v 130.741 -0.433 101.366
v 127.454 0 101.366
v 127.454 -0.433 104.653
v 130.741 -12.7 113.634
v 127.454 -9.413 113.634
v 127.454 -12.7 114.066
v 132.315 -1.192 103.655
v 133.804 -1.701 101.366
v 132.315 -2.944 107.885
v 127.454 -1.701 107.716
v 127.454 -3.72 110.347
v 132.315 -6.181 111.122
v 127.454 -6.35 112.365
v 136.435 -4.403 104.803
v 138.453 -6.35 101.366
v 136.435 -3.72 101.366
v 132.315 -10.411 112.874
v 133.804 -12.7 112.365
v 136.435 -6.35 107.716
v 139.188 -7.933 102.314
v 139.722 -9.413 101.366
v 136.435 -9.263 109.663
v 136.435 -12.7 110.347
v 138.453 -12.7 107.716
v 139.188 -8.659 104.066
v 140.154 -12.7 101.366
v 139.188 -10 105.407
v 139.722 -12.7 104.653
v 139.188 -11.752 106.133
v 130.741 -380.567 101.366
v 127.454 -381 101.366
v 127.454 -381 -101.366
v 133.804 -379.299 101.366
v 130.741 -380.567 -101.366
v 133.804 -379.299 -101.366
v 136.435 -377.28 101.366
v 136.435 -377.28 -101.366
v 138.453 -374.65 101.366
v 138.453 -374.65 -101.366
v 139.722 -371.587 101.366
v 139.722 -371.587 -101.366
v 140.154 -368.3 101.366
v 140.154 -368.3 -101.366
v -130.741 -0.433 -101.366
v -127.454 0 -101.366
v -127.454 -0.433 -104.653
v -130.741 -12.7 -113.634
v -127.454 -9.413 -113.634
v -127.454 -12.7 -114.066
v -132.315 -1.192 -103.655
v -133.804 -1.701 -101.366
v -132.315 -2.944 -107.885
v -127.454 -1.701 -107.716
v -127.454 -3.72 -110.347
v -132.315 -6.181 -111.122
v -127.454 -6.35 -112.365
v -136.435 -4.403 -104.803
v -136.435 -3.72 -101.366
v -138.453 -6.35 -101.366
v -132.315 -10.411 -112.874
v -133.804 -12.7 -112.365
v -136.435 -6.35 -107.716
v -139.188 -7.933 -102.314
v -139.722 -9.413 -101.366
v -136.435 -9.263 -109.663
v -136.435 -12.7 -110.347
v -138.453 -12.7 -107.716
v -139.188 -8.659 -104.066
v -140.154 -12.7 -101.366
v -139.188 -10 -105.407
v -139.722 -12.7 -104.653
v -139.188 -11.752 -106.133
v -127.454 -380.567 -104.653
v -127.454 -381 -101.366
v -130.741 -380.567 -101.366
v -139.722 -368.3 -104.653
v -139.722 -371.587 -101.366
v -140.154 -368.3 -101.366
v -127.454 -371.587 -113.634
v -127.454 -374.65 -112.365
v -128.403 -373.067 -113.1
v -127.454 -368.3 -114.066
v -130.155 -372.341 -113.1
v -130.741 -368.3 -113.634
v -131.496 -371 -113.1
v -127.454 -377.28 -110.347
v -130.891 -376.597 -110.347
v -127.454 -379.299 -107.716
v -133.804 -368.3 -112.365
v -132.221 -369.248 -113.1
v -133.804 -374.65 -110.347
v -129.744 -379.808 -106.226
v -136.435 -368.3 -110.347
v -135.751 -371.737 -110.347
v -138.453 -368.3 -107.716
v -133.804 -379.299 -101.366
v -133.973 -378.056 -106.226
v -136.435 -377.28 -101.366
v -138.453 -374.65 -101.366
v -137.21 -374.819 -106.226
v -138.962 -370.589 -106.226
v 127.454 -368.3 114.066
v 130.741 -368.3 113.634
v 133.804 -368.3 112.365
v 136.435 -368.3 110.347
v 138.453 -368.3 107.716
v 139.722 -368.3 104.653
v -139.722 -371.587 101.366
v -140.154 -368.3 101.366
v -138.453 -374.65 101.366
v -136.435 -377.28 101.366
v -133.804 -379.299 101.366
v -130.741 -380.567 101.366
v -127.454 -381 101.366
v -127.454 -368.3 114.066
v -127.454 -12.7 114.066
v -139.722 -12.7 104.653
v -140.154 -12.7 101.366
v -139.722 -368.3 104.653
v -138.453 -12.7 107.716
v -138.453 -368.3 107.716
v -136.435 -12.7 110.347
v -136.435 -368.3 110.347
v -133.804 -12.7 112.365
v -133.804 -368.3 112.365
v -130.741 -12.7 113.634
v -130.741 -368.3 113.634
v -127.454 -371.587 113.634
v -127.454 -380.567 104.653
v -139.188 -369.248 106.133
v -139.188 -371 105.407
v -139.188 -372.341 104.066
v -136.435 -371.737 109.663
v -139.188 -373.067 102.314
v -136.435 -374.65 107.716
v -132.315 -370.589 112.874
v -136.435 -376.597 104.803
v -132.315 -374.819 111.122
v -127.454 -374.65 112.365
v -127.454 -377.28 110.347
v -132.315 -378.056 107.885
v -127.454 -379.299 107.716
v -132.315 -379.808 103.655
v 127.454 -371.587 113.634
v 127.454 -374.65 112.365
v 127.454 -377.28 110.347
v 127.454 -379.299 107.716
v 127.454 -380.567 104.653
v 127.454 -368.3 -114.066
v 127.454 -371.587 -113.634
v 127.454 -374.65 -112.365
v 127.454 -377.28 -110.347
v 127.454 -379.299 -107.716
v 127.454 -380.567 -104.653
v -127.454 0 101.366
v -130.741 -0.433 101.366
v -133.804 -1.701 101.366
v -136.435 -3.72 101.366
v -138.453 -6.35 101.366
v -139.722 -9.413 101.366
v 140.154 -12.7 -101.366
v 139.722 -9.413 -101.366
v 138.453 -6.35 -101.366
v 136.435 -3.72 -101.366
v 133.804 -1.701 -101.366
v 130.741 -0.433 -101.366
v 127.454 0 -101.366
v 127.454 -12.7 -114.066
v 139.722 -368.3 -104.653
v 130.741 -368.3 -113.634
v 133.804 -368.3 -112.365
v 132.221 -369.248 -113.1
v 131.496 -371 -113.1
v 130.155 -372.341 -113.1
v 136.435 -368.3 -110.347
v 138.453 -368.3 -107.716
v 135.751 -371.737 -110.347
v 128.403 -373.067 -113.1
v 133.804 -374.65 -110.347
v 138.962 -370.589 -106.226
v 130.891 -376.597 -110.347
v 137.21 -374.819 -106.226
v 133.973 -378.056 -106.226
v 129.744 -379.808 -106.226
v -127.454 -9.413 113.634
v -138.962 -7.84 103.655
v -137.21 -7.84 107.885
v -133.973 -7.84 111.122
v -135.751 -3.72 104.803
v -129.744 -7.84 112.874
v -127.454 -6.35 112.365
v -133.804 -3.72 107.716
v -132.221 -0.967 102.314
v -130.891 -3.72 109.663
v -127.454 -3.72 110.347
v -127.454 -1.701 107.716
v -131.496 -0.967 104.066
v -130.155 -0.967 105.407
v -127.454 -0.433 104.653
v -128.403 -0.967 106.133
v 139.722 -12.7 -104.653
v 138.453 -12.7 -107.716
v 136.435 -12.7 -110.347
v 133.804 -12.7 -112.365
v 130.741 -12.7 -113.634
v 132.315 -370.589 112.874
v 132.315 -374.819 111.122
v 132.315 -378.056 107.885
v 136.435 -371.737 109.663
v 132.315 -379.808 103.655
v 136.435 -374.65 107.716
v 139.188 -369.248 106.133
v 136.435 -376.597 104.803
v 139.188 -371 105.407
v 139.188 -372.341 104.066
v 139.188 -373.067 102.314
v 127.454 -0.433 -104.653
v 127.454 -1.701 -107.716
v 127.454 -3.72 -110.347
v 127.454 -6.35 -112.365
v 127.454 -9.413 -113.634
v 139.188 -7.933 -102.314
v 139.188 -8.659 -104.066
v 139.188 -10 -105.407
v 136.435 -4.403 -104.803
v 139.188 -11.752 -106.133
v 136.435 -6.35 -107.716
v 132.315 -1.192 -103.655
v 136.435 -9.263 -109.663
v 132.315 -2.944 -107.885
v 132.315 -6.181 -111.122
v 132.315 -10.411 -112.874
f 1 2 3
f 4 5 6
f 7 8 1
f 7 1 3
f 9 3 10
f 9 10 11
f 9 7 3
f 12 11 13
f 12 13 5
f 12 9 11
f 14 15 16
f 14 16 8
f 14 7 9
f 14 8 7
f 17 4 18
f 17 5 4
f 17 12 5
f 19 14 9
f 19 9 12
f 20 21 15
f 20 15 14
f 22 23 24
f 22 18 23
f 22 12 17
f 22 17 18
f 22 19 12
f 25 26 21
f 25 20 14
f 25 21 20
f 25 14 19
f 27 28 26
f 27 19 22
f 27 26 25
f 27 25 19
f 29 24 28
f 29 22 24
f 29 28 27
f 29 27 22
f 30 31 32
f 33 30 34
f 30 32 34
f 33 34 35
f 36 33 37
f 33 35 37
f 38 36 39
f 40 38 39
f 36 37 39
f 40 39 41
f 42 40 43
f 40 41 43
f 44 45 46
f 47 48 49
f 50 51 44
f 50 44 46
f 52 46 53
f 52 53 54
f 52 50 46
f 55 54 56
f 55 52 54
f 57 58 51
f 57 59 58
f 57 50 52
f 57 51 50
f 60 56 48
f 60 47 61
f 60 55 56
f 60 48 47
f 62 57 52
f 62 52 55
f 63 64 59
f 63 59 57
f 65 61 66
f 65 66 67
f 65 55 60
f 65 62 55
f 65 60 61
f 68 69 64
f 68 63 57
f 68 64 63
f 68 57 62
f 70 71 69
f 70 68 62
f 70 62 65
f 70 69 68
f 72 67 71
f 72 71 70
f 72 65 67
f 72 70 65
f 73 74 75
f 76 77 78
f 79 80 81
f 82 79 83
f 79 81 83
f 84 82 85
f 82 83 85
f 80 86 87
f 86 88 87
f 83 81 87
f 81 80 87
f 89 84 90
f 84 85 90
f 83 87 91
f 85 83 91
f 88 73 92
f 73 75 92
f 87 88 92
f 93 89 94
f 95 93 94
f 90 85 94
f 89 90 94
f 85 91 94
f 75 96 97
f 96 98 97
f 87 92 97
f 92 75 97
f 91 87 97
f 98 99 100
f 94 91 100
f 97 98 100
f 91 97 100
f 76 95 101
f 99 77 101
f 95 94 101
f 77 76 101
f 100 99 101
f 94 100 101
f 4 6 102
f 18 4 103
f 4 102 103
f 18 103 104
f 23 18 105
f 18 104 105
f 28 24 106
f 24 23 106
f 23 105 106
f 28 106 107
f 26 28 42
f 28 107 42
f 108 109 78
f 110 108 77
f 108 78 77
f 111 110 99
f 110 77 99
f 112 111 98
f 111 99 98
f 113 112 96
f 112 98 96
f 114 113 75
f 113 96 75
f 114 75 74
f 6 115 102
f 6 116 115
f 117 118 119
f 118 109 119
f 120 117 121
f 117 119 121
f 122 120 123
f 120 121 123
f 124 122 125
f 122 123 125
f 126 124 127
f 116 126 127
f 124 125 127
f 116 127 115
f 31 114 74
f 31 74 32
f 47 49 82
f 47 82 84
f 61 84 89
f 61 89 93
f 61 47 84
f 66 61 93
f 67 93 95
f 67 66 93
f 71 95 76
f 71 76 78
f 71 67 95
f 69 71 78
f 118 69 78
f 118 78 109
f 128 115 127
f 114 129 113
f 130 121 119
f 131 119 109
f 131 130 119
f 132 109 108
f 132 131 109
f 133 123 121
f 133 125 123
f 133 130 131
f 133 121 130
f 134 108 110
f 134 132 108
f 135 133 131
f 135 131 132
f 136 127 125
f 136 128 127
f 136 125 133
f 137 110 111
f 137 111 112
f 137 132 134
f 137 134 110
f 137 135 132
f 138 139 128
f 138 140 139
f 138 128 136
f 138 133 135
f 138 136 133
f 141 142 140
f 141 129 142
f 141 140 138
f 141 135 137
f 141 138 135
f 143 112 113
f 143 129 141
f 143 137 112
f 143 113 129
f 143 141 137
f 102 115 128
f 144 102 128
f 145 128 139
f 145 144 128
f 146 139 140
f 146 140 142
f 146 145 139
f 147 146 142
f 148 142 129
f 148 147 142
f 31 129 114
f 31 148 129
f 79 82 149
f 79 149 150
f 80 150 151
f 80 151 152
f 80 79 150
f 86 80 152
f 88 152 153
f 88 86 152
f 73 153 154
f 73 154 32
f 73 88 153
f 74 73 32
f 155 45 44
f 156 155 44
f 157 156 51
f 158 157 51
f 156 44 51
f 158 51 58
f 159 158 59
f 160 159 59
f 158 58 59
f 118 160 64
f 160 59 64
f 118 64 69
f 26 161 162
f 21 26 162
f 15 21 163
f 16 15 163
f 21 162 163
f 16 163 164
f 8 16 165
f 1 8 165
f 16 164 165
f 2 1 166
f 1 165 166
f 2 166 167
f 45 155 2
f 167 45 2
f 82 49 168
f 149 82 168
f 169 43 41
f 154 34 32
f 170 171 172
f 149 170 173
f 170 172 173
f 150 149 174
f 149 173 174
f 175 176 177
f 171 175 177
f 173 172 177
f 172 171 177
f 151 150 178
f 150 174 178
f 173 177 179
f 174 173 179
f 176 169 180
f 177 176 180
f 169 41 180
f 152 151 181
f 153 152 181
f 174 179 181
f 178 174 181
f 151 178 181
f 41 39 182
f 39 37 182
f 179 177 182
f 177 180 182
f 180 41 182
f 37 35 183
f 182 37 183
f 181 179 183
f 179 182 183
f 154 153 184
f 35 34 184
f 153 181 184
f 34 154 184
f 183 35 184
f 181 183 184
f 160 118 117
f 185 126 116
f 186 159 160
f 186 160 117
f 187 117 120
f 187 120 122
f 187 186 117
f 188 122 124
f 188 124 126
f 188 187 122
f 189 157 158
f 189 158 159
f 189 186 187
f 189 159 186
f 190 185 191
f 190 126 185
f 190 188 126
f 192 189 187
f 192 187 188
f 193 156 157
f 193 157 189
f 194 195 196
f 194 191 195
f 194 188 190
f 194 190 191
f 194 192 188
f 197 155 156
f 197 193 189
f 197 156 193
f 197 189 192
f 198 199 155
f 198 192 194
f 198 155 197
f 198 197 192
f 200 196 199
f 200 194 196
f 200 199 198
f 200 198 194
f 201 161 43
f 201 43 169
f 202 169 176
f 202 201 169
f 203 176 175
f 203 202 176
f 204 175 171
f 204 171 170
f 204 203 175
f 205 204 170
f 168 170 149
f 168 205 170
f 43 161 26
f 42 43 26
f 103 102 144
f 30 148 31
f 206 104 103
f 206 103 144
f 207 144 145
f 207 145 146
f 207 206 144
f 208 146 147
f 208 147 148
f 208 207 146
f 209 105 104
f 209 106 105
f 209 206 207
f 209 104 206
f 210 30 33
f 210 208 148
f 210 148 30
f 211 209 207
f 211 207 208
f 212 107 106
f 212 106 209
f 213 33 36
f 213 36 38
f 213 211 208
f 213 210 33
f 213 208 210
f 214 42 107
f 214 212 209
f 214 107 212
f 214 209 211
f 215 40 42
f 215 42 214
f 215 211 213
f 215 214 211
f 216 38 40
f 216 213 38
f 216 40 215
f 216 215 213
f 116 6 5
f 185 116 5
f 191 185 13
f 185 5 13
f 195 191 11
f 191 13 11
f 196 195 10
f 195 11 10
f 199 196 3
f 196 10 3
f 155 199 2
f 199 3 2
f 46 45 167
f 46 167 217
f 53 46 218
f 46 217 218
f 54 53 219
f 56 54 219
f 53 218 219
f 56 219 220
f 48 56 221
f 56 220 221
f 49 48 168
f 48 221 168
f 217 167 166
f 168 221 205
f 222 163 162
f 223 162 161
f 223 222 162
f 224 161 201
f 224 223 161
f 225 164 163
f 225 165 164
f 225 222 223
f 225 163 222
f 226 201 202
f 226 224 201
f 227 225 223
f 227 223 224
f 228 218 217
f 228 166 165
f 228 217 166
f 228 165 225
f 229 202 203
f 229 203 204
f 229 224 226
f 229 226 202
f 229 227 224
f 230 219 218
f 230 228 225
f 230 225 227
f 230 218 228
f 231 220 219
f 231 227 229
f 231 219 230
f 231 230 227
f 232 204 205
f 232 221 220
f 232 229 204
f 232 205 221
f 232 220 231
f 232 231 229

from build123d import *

# Parameters (mm, degrees)
F0_W         = 280.3089916706
F0_H         = 228.1326651573
F1_DEPTH     = 381
F2_R         = 12.7
F3_R         = 12.7
F4_R         = 12.7
F5_T1_DEPTH  = 202.7326651573
F5_T3_DEPTH  = 355.6
F5_T5_DEPTH  = 254.9089916706
F5_S9_W      = 12.7
F5_S9_H      = 12.7
F5_T10_DEPTH = 12.7
F5_S15_W     = 12.7
F5_S15_H     = 12.7
F5_T16_DEPTH = 12.7
F5_T20_ANGLE = 90
F5_T22_ANGLE = 90
F5_T24_ANGLE = 90
F5_T26_ANGLE = 90


# Not quite as in the source:
# - a fillet or chamfer that OpenCascade refuses, or shapes differently, is made with other operations: its cross-section is extruded or revolved along the edge and cut away or added


with BuildPart() as f1:
    # F0 (on Front) → F1 (new body)
    with BuildSketch(Plane.XZ):
        Rectangle(F0_W, F0_H)
    extrude(amount=F1_DEPTH)

    # F2
    f2_edges = [f1.edges().sort_by_distance(p)[0] for p in [
        (0, -381, 114.066333),
    ]]
    fillet(f2_edges, radius=F2_R)

    # F3
    f3_edges = [f1.edges().sort_by_distance(p)[0] for p in [
        (140.154496, -184.15, 114.066333),
        (0, 0, 114.066333),
        (-140.154496, -184.15, 114.066333),
    ]]
    fillet(f3_edges, radius=F3_R)

    # F4
    f4_edges = [f1.edges().sort_by_distance(p)[0] for p in [
        (0, 0, -114.066333),
    ]]
    fillet(f4_edges, radius=F4_R)

    # F5: fillet of radius 12.7 on 1 edges, made by hand

    # F5_s2 → F5_t1 (cut)
    with BuildSketch(Plane.XY.offset(-101.3663325787)):
        with BuildLine():
            ThreePointArc((-127.4544958353, 0), (-136.4347519564, -3.7197438789), (-140.1544958353, -12.7))
            Line((-140.1544958353, -12.7), (-140.1544958353, 0))
            Line((-140.1544958353, 0), (-127.4544958353, 0))
        make_face()
        with BuildLine():
            ThreePointArc((140.1544958353, -12.7), (136.4347519564, -3.7197438789), (127.4544958353, 0))
            Line((127.4544958353, 0), (140.1544958353, 0))
            Line((140.1544958353, 0), (140.1544958353, -12.7))
        make_face()
    extrude(amount=F5_T1_DEPTH, mode=Mode.SUBTRACT)

    # F5_s4 → F5_t3 (cut)
    with BuildSketch(Plane.XZ.offset(12.7)):
        with BuildLine():
            ThreePointArc((-127.4544958353, -114.0663325787), (-136.4347519564, -110.3465886997), (-140.1544958353, -101.3663325787))
            Line((-140.1544958353, -101.3663325787), (-140.1544958353, -114.0663325787))
            Line((-140.1544958353, -114.0663325787), (-127.4544958353, -114.0663325787))
        make_face()
        with BuildLine():
            ThreePointArc((140.1544958353, -101.3663325787), (136.4347519564, -110.3465886997), (127.4544958353, -114.0663325787))
            Line((127.4544958353, -114.0663325787), (140.1544958353, -114.0663325787))
            Line((140.1544958353, -114.0663325787), (140.1544958353, -101.3663325787))
        make_face()
    extrude(amount=F5_T3_DEPTH, mode=Mode.SUBTRACT)

    # F5_s6 → F5_t5 (cut)
    with BuildSketch(Plane.YZ.offset(-127.4544958353)):
        with BuildLine():
            ThreePointArc((-368.3, -114.0663325787), (-377.2802561211, -110.3465886997), (-381, -101.3663325787))
            Line((-381, -101.3663325787), (-381, -114.0663325787))
            Line((-381, -114.0663325787), (-368.3, -114.0663325787))
        make_face()
    extrude(amount=F5_T5_DEPTH, mode=Mode.SUBTRACT)


with BuildPart() as f5_tool8:
    # F5_s9 → F5_t10 (new body)
    with BuildSketch(Plane.XZ.offset(12.7)):
        with Locations((-133.8044958353, 107.7163325787)):
            Rectangle(F5_S9_W, F5_S9_H)
    extrude(amount=-F5_T10_DEPTH)

    # F5_s11 → F5_t12 (revolve, cut)
    with BuildSketch(Plane(origin=(-127.4544958353, -12.7, 101.3663325787), x_dir=(0.7071067812, 0, -0.7071067812), z_dir=(0.7071067812, 0, 0.7071067812))):
        with BuildLine():
            ThreePointArc((0, -12.7), (12.7, 0), (0, 12.7))
            Line((0, 12.7), (0, -12.7))
        make_face()
    revolve(axis=Axis((-127.4544958353, -12.7, 101.3663325787), (0, 1, 0)), mode=Mode.SUBTRACT)


with BuildPart() as f1_1:
    add(f1.part)

    # F5_t7: cut F5_tool8
    add(f5_tool8.part, mode=Mode.SUBTRACT)


with BuildPart() as f5_tool14:
    # F5_s15 → F5_t16 (new body)
    with BuildSketch(Plane.YZ.offset(127.4544958353)):
        with Locations((-6.35, 107.7163325787)):
            Rectangle(F5_S15_W, F5_S15_H)
    extrude(amount=F5_T16_DEPTH)

    # F5_s17 → F5_t18 (revolve, cut)
    with BuildSketch(Plane(origin=(127.4544958353, -12.7, 101.3663325787), x_dir=(0, -0.7071067812, -0.7071067812), z_dir=(0, -0.7071067812, 0.7071067812))):
        with BuildLine():
            ThreePointArc((0, -12.7), (12.7, 0), (0, 12.7))
            Line((0, 12.7), (0, -12.7))
        make_face()
    revolve(axis=Axis((127.4544958353, -12.7, 101.3663325787), (1, 0, 0)), mode=Mode.SUBTRACT)


with BuildPart() as f1_2:
    add(f1_1.part)

    # F5_t13: cut F5_tool14
    add(f5_tool14.part, mode=Mode.SUBTRACT)

    # F5_s19 → F5_t20 (revolve, cut)
    with BuildSketch(Plane.XY.offset(-101.3663325787)):
        with BuildLine():
            ThreePointArc((-127.4544958353, 0), (-136.4347519564, -3.7197438789), (-140.1544958353, -12.7))
            Line((-140.1544958353, -12.7), (-140.1544958353, 0))
            Line((-140.1544958353, 0), (-127.4544958353, 0))
        make_face()
    revolve(axis=Axis((-140.1544958353, -12.7, -101.3663325787), (-1, 0, 0)), revolution_arc=F5_T20_ANGLE, mode=Mode.SUBTRACT)

    # F5_s21 → F5_t22 (revolve, cut)
    with BuildSketch(Plane.YZ.offset(-127.4544958353)):
        with BuildLine():
            ThreePointArc((-368.3, -114.0663325787), (-377.2802561211, -110.3465886997), (-381, -101.3663325787))
            Line((-381, -101.3663325787), (-381, -114.0663325787))
            Line((-381, -114.0663325787), (-368.3, -114.0663325787))
        make_face()
    revolve(axis=Axis((-127.4544958353, -368.3, -114.0663325787), (0, 0, -1)), revolution_arc=F5_T22_ANGLE, mode=Mode.SUBTRACT)

    # F5_s23 → F5_t24 (revolve, cut)
    with BuildSketch(Plane.XZ.offset(368.3)):
        with BuildLine():
            ThreePointArc((127.4544958353, -114.0663325787), (136.4347519564, -110.3465886997), (140.1544958353, -101.3663325787))
            Line((140.1544958353, -101.3663325787), (140.1544958353, -114.0663325787))
            Line((140.1544958353, -114.0663325787), (127.4544958353, -114.0663325787))
        make_face()
    revolve(axis=Axis((127.4544958353, -368.3, -114.0663325787), (0, 0, -1)), revolution_arc=F5_T24_ANGLE, mode=Mode.SUBTRACT)

    # F5_s25 → F5_t26 (revolve, cut)
    with BuildSketch(Plane.XY.offset(-101.3663325787)):
        with BuildLine():
            ThreePointArc((140.1544958353, -12.7), (136.4347519564, -3.7197438789), (127.4544958353, 0))
            Line((127.4544958353, 0), (140.1544958353, 0))
            Line((140.1544958353, 0), (140.1544958353, -12.7))
        make_face()
    revolve(axis=Axis((140.1544958353, -12.7, -101.3663325787), (-1, 0, 0)), revolution_arc=F5_T26_ANGLE, mode=Mode.SUBTRACT)


solid = f1_2.part
